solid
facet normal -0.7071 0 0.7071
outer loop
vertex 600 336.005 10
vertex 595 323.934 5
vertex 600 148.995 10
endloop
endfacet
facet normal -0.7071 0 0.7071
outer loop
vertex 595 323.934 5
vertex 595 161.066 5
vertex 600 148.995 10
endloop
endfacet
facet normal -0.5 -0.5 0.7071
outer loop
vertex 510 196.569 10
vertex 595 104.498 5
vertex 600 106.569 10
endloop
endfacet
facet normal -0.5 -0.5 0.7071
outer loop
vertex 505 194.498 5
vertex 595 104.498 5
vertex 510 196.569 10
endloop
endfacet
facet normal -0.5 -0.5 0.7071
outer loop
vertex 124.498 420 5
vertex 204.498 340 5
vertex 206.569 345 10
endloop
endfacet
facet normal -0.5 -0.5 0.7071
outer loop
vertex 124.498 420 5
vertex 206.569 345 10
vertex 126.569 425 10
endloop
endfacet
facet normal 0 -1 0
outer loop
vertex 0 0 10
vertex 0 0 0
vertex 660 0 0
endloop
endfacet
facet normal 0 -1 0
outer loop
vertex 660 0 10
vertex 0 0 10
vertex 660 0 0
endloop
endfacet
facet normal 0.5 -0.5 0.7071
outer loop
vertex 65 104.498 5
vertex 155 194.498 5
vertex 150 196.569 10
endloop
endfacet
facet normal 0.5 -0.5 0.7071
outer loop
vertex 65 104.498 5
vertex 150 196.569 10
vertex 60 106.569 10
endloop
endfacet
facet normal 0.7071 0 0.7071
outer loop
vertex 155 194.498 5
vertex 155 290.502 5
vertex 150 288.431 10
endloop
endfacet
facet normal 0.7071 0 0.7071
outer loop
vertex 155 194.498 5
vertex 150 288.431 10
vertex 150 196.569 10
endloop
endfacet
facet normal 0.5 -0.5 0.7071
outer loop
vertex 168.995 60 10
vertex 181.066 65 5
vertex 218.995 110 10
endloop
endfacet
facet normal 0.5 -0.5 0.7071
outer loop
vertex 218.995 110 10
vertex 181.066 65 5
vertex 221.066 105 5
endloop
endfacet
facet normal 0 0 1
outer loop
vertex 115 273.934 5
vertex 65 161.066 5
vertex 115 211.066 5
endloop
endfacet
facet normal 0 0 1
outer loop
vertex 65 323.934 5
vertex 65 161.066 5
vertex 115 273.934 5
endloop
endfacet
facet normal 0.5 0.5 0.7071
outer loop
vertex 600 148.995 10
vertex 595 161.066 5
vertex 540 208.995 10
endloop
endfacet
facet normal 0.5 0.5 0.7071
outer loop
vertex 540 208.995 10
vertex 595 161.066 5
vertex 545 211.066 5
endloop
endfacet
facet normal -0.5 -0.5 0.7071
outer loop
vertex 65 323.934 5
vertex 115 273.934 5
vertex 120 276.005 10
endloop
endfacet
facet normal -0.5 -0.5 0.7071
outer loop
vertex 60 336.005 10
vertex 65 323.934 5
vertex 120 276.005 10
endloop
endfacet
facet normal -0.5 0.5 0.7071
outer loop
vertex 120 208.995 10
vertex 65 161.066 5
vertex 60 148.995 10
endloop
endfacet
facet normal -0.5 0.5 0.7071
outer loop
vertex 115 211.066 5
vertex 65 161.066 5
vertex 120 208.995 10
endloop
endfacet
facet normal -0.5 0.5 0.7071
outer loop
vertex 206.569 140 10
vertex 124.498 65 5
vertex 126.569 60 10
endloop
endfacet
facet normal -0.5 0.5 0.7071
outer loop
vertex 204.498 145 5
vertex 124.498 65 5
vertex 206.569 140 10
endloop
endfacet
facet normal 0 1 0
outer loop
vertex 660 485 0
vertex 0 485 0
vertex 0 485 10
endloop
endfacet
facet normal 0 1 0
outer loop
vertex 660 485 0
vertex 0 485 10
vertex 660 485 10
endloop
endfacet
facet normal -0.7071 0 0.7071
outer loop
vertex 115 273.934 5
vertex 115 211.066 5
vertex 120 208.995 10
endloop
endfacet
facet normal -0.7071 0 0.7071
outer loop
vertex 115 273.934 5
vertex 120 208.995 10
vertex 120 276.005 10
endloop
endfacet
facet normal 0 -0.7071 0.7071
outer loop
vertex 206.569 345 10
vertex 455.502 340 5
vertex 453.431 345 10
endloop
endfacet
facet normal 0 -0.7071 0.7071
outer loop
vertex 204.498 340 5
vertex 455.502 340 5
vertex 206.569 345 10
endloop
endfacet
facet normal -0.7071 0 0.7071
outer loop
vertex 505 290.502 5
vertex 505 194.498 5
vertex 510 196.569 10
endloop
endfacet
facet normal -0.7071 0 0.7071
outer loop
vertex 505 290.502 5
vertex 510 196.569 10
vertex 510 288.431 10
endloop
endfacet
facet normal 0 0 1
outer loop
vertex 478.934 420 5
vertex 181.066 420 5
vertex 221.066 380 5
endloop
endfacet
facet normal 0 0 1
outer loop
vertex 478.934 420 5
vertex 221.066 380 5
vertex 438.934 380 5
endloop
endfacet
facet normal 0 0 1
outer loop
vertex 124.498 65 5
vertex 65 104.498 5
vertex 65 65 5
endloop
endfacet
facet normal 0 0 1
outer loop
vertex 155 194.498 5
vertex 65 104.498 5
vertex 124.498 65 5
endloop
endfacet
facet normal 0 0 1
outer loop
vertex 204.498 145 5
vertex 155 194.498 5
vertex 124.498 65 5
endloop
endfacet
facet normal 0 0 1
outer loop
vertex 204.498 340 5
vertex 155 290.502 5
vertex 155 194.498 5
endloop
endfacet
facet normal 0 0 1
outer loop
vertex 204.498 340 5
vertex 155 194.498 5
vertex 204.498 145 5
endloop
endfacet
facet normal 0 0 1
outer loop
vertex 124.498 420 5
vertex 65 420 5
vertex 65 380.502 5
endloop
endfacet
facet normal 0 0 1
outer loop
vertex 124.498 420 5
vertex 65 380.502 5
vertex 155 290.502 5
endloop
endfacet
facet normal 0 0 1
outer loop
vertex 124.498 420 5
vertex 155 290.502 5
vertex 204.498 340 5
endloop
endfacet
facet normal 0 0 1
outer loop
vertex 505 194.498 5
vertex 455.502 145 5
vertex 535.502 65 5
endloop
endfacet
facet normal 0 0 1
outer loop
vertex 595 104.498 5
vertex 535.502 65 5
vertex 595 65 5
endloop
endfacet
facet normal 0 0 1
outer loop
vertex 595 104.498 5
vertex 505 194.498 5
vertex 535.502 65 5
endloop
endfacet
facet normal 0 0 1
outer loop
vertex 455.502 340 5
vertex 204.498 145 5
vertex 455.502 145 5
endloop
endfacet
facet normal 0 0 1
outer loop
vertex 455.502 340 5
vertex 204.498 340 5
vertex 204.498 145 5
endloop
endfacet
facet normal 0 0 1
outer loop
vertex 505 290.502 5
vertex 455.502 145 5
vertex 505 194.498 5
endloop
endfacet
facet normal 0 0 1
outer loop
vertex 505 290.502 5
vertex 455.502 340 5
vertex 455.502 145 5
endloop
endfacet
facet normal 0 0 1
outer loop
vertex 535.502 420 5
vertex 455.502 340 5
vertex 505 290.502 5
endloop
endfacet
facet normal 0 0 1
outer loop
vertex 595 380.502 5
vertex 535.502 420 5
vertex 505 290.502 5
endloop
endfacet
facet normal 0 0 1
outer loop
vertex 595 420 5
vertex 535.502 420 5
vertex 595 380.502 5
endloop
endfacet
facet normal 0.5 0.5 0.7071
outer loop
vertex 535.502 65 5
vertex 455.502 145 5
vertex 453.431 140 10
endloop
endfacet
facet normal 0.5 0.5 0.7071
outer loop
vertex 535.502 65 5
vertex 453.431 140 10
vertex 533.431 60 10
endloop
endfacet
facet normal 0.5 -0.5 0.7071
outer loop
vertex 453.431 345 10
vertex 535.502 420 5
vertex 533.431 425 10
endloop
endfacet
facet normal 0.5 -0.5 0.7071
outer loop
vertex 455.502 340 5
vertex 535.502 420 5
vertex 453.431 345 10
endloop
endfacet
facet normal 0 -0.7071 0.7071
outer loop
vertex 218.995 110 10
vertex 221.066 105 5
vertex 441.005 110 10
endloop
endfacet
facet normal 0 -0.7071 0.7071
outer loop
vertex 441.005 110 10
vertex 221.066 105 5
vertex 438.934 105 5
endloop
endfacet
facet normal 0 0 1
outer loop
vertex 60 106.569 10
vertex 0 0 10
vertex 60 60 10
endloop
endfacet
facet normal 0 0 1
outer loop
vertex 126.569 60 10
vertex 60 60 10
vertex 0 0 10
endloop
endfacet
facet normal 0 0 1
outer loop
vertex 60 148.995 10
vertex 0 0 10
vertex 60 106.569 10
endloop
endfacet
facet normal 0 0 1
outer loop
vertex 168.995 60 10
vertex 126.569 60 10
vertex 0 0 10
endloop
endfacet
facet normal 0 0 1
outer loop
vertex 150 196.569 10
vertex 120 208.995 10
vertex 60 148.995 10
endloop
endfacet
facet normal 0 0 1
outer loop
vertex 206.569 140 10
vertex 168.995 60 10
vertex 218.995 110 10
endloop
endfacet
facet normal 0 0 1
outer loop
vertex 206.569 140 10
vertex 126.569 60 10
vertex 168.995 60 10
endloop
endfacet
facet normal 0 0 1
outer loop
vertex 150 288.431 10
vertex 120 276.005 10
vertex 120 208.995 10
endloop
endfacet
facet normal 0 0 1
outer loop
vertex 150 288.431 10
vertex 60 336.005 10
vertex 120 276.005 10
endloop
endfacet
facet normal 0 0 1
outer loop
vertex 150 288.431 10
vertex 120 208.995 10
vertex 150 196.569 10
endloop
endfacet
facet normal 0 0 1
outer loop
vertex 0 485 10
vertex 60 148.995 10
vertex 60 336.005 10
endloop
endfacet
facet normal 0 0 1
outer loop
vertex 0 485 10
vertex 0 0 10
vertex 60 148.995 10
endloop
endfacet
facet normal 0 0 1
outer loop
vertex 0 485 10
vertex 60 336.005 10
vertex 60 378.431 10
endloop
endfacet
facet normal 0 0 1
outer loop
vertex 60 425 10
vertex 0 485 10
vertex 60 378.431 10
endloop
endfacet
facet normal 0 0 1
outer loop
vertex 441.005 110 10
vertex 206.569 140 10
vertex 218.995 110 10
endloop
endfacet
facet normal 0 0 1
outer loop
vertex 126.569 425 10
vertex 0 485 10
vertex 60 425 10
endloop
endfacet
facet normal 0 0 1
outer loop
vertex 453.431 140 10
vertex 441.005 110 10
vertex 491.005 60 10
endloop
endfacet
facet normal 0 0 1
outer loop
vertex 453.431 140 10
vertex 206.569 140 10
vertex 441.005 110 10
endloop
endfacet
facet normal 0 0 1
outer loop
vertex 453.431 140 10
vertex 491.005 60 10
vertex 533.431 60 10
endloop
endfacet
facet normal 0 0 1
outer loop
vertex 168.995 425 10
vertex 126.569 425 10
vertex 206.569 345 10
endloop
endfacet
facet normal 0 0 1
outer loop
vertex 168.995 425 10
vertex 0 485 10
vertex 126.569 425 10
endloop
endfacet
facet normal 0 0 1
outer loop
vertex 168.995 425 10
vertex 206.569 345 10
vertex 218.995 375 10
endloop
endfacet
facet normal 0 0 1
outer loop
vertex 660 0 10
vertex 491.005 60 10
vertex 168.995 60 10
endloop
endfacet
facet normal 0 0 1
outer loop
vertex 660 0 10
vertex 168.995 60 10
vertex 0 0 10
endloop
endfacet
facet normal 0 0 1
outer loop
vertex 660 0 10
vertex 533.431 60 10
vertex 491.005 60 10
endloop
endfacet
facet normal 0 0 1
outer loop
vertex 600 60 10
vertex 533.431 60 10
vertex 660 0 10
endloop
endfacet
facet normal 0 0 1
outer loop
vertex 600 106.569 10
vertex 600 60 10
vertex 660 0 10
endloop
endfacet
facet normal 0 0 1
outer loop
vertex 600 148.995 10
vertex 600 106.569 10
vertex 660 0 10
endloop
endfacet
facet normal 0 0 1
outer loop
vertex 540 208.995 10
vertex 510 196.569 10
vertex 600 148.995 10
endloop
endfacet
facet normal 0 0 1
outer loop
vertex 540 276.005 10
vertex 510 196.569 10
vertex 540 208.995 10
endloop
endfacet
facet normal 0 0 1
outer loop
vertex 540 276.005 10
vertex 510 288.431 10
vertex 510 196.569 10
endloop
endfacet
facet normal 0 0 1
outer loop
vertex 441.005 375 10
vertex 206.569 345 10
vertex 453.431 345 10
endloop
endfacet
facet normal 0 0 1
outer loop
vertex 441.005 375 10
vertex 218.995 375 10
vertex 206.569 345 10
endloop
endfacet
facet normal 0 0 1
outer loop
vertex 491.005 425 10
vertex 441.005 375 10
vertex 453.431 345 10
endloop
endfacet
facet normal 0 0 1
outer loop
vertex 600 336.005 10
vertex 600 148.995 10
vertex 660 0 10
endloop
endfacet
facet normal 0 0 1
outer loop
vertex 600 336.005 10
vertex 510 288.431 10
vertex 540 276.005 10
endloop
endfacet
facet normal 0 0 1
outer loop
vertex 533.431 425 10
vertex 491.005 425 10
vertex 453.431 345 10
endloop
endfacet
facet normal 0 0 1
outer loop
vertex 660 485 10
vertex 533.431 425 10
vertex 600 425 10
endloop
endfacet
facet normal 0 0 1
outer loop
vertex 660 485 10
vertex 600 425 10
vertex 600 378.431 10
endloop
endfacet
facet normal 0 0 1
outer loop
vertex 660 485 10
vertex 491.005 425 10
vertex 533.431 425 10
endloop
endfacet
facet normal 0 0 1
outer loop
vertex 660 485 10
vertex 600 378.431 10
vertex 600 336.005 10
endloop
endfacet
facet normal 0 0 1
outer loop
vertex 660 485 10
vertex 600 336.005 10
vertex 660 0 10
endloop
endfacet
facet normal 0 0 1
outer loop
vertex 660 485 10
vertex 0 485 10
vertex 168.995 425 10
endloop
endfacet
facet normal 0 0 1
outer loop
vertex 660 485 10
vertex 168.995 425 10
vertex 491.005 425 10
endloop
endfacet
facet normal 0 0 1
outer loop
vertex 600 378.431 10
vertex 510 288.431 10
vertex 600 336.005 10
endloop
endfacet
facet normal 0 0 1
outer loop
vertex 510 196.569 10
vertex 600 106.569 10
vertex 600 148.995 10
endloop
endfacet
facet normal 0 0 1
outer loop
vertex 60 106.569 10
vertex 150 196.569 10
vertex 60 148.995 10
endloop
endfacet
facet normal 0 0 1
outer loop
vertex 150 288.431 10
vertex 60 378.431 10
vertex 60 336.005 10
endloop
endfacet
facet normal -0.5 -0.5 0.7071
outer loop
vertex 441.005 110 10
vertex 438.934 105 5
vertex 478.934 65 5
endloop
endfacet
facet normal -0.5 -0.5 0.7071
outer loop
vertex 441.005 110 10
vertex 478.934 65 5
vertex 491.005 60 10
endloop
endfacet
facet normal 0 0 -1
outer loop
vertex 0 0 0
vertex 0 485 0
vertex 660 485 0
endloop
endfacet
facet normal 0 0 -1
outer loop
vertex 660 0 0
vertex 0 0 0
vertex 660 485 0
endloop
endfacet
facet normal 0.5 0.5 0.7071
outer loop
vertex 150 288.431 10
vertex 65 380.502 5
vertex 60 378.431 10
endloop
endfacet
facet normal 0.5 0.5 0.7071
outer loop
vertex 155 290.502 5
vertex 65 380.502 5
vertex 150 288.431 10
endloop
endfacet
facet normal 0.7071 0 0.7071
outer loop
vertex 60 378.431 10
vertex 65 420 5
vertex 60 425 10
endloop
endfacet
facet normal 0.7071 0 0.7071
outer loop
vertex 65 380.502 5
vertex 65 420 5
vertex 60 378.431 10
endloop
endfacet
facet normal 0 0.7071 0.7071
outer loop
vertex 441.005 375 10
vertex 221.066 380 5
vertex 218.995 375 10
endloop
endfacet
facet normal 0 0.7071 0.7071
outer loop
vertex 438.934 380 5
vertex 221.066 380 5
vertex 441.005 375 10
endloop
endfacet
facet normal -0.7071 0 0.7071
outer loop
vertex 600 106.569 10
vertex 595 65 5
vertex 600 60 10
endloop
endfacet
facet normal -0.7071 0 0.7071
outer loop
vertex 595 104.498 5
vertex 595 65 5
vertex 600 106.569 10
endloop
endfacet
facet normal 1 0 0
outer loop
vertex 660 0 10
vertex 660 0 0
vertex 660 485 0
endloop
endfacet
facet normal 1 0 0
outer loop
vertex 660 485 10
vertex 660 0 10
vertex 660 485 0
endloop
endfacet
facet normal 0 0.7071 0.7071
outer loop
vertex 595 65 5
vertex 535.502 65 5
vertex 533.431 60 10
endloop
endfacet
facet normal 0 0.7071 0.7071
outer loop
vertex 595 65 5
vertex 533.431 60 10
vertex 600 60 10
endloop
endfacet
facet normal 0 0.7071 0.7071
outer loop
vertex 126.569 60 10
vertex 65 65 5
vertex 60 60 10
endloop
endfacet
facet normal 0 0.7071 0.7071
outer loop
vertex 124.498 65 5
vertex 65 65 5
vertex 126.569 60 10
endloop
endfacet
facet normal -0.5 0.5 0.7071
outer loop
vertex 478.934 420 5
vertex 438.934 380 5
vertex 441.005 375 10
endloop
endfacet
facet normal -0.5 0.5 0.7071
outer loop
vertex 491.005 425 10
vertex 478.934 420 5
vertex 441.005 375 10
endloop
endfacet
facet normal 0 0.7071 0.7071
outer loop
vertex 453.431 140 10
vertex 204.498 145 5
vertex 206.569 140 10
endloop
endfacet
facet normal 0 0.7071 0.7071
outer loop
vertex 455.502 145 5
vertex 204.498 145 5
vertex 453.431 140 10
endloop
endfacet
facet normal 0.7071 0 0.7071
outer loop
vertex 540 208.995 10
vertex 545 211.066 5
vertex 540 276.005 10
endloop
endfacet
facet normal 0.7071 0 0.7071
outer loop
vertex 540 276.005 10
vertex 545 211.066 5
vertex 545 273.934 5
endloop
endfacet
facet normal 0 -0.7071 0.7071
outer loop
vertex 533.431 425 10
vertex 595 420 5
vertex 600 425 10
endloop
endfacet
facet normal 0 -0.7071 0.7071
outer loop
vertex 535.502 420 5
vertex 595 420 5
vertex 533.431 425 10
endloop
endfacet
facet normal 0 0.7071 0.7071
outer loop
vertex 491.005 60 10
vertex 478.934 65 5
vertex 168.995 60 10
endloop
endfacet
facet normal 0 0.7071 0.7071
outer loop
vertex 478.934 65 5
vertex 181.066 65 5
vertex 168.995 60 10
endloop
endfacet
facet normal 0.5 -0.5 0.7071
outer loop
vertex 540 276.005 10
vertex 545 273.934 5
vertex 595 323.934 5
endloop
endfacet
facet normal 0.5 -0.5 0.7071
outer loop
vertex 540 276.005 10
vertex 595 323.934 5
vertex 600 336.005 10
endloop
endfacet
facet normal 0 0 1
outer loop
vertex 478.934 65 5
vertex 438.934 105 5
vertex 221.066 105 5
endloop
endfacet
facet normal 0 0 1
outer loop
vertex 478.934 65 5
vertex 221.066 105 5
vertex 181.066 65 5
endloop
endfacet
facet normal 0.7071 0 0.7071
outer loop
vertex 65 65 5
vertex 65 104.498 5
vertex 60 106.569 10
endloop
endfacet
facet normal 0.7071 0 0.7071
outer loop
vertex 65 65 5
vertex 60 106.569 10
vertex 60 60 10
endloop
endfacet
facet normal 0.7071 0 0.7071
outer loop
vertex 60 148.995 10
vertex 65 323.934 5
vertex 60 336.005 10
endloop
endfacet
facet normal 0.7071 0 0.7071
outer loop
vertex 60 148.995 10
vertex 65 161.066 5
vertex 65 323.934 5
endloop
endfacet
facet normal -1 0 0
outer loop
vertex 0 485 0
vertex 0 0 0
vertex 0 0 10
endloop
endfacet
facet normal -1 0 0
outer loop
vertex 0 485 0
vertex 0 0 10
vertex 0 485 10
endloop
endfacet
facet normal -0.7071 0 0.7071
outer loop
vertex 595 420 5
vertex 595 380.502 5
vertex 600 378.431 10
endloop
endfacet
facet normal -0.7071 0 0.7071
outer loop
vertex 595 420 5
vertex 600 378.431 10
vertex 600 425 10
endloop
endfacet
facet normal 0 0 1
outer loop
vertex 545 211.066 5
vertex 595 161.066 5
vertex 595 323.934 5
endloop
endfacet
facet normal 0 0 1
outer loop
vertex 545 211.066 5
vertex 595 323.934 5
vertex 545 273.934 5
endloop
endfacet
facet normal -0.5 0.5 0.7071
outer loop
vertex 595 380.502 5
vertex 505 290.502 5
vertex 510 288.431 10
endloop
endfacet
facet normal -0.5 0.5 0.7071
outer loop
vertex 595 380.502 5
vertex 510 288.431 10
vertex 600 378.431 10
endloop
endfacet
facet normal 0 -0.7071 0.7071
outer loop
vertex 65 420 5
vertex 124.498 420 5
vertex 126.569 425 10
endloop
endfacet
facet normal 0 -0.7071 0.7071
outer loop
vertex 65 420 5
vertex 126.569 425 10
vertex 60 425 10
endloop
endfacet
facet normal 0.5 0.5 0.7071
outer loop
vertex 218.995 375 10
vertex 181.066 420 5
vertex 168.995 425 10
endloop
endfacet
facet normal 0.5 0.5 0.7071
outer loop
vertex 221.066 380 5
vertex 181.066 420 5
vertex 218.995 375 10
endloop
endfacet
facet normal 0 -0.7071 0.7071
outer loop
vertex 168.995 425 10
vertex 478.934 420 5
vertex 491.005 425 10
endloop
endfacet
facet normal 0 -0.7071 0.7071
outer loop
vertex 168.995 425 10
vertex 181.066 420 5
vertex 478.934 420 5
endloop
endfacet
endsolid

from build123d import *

# Parameters (mm, degrees)
ESQUISSE1_W             = 660
ESQUISSE1_H             = 485
BOSS_EXTRU_1_DEPTH      = 10
ENL_V_MAT_EXTRU_1_DEPTH = 5
CHANFREIN1_SIZE         = 5


with BuildPart() as part:
    # Esquisse1 → Boss.-Extru.1 (new body)
    with BuildSketch(Plane.XY):
        with Locations((330, 242.5)):
            Rectangle(ESQUISSE1_W, ESQUISSE1_H)
    extrude(amount=BOSS_EXTRU_1_DEPTH)

    # Esquisse2 → Enlèv. mat.-Extru.1 (cut)
    with BuildSketch(Plane.XY.offset(10)):
        Polygon((120, 208.994949366), (120, 276.005050634), (60, 336.005050634), (60, 148.994949366), align=None)
        Polygon((218.994949366, 375), (441.005050634, 375), (491.005050634, 425), (168.994949366, 425), align=None)
        Polygon((60, 425), (60, 378.431457505), (150, 288.431457505), (150, 196.568542495), (60, 106.568542495), (60, 60), (126.568542495, 60), (206.568542495, 140), (453.431457505, 140), (533.431457505, 60), (600, 60), (600, 106.568542495), (510, 196.568542495), (510, 288.431457505), (600, 378.431457505), (600, 425), (533.431457505, 425), (453.431457505, 345), (206.568542495, 345), (126.568542495, 425), align=None)
        Polygon((540, 208.994949366), (540, 276.005050634), (600, 336.005050634), (600, 148.994949366), align=None)
        Polygon((491.005050634, 60), (168.994949366, 60), (218.994949366, 110), (441.005050634, 110), align=None)
    extrude(amount=-ENL_V_MAT_EXTRU_1_DEPTH, mode=Mode.SUBTRACT)

    # Chanfrein1
    chanfrein1_edges = [part.edges().sort_by_distance(p)[0] for p in [
        (330, 60, 5),
        (193.994949366, 85, 5),
        (330, 110, 5),
        (466.005050634, 85, 5),
        (60, 242.5, 5),
        (90, 306.005050634, 5),
        (120, 242.5, 5),
        (90, 178.994949366, 5),
        (600, 242.5, 5),
        (570, 178.994949366, 5),
        (540, 242.5, 5),
        (570, 306.005050634, 5),
        (166.568542495, 385, 5),
        (330, 345, 5),
        (493.431457505, 385, 5),
        (566.715728753, 425, 5),
        (600, 401.715728753, 5),
        (555, 333.431457505, 5),
        (510, 242.5, 5),
        (555, 151.568542495, 5),
        (600, 83.284271247, 5),
        (566.715728753, 60, 5),
        (493.431457505, 100, 5),
        (330, 140, 5),
        (166.568542495, 100, 5),
        (93.284271247, 60, 5),
        (60, 83.284271247, 5),
        (105, 151.568542495, 5),
        (150, 242.5, 5),
        (105, 333.431457505, 5),
        (60, 401.715728753, 5),
        (93.284271247, 425, 5),
        (330, 425, 5),
        (466.005050634, 400, 5),
        (330, 375, 5),
        (193.994949366, 400, 5),
    ]]
    chamfer(chanfrein1_edges, length=CHANFREIN1_SIZE - 0.0001)  # a hair under: the kernel refuses the full size


solid = part.part
